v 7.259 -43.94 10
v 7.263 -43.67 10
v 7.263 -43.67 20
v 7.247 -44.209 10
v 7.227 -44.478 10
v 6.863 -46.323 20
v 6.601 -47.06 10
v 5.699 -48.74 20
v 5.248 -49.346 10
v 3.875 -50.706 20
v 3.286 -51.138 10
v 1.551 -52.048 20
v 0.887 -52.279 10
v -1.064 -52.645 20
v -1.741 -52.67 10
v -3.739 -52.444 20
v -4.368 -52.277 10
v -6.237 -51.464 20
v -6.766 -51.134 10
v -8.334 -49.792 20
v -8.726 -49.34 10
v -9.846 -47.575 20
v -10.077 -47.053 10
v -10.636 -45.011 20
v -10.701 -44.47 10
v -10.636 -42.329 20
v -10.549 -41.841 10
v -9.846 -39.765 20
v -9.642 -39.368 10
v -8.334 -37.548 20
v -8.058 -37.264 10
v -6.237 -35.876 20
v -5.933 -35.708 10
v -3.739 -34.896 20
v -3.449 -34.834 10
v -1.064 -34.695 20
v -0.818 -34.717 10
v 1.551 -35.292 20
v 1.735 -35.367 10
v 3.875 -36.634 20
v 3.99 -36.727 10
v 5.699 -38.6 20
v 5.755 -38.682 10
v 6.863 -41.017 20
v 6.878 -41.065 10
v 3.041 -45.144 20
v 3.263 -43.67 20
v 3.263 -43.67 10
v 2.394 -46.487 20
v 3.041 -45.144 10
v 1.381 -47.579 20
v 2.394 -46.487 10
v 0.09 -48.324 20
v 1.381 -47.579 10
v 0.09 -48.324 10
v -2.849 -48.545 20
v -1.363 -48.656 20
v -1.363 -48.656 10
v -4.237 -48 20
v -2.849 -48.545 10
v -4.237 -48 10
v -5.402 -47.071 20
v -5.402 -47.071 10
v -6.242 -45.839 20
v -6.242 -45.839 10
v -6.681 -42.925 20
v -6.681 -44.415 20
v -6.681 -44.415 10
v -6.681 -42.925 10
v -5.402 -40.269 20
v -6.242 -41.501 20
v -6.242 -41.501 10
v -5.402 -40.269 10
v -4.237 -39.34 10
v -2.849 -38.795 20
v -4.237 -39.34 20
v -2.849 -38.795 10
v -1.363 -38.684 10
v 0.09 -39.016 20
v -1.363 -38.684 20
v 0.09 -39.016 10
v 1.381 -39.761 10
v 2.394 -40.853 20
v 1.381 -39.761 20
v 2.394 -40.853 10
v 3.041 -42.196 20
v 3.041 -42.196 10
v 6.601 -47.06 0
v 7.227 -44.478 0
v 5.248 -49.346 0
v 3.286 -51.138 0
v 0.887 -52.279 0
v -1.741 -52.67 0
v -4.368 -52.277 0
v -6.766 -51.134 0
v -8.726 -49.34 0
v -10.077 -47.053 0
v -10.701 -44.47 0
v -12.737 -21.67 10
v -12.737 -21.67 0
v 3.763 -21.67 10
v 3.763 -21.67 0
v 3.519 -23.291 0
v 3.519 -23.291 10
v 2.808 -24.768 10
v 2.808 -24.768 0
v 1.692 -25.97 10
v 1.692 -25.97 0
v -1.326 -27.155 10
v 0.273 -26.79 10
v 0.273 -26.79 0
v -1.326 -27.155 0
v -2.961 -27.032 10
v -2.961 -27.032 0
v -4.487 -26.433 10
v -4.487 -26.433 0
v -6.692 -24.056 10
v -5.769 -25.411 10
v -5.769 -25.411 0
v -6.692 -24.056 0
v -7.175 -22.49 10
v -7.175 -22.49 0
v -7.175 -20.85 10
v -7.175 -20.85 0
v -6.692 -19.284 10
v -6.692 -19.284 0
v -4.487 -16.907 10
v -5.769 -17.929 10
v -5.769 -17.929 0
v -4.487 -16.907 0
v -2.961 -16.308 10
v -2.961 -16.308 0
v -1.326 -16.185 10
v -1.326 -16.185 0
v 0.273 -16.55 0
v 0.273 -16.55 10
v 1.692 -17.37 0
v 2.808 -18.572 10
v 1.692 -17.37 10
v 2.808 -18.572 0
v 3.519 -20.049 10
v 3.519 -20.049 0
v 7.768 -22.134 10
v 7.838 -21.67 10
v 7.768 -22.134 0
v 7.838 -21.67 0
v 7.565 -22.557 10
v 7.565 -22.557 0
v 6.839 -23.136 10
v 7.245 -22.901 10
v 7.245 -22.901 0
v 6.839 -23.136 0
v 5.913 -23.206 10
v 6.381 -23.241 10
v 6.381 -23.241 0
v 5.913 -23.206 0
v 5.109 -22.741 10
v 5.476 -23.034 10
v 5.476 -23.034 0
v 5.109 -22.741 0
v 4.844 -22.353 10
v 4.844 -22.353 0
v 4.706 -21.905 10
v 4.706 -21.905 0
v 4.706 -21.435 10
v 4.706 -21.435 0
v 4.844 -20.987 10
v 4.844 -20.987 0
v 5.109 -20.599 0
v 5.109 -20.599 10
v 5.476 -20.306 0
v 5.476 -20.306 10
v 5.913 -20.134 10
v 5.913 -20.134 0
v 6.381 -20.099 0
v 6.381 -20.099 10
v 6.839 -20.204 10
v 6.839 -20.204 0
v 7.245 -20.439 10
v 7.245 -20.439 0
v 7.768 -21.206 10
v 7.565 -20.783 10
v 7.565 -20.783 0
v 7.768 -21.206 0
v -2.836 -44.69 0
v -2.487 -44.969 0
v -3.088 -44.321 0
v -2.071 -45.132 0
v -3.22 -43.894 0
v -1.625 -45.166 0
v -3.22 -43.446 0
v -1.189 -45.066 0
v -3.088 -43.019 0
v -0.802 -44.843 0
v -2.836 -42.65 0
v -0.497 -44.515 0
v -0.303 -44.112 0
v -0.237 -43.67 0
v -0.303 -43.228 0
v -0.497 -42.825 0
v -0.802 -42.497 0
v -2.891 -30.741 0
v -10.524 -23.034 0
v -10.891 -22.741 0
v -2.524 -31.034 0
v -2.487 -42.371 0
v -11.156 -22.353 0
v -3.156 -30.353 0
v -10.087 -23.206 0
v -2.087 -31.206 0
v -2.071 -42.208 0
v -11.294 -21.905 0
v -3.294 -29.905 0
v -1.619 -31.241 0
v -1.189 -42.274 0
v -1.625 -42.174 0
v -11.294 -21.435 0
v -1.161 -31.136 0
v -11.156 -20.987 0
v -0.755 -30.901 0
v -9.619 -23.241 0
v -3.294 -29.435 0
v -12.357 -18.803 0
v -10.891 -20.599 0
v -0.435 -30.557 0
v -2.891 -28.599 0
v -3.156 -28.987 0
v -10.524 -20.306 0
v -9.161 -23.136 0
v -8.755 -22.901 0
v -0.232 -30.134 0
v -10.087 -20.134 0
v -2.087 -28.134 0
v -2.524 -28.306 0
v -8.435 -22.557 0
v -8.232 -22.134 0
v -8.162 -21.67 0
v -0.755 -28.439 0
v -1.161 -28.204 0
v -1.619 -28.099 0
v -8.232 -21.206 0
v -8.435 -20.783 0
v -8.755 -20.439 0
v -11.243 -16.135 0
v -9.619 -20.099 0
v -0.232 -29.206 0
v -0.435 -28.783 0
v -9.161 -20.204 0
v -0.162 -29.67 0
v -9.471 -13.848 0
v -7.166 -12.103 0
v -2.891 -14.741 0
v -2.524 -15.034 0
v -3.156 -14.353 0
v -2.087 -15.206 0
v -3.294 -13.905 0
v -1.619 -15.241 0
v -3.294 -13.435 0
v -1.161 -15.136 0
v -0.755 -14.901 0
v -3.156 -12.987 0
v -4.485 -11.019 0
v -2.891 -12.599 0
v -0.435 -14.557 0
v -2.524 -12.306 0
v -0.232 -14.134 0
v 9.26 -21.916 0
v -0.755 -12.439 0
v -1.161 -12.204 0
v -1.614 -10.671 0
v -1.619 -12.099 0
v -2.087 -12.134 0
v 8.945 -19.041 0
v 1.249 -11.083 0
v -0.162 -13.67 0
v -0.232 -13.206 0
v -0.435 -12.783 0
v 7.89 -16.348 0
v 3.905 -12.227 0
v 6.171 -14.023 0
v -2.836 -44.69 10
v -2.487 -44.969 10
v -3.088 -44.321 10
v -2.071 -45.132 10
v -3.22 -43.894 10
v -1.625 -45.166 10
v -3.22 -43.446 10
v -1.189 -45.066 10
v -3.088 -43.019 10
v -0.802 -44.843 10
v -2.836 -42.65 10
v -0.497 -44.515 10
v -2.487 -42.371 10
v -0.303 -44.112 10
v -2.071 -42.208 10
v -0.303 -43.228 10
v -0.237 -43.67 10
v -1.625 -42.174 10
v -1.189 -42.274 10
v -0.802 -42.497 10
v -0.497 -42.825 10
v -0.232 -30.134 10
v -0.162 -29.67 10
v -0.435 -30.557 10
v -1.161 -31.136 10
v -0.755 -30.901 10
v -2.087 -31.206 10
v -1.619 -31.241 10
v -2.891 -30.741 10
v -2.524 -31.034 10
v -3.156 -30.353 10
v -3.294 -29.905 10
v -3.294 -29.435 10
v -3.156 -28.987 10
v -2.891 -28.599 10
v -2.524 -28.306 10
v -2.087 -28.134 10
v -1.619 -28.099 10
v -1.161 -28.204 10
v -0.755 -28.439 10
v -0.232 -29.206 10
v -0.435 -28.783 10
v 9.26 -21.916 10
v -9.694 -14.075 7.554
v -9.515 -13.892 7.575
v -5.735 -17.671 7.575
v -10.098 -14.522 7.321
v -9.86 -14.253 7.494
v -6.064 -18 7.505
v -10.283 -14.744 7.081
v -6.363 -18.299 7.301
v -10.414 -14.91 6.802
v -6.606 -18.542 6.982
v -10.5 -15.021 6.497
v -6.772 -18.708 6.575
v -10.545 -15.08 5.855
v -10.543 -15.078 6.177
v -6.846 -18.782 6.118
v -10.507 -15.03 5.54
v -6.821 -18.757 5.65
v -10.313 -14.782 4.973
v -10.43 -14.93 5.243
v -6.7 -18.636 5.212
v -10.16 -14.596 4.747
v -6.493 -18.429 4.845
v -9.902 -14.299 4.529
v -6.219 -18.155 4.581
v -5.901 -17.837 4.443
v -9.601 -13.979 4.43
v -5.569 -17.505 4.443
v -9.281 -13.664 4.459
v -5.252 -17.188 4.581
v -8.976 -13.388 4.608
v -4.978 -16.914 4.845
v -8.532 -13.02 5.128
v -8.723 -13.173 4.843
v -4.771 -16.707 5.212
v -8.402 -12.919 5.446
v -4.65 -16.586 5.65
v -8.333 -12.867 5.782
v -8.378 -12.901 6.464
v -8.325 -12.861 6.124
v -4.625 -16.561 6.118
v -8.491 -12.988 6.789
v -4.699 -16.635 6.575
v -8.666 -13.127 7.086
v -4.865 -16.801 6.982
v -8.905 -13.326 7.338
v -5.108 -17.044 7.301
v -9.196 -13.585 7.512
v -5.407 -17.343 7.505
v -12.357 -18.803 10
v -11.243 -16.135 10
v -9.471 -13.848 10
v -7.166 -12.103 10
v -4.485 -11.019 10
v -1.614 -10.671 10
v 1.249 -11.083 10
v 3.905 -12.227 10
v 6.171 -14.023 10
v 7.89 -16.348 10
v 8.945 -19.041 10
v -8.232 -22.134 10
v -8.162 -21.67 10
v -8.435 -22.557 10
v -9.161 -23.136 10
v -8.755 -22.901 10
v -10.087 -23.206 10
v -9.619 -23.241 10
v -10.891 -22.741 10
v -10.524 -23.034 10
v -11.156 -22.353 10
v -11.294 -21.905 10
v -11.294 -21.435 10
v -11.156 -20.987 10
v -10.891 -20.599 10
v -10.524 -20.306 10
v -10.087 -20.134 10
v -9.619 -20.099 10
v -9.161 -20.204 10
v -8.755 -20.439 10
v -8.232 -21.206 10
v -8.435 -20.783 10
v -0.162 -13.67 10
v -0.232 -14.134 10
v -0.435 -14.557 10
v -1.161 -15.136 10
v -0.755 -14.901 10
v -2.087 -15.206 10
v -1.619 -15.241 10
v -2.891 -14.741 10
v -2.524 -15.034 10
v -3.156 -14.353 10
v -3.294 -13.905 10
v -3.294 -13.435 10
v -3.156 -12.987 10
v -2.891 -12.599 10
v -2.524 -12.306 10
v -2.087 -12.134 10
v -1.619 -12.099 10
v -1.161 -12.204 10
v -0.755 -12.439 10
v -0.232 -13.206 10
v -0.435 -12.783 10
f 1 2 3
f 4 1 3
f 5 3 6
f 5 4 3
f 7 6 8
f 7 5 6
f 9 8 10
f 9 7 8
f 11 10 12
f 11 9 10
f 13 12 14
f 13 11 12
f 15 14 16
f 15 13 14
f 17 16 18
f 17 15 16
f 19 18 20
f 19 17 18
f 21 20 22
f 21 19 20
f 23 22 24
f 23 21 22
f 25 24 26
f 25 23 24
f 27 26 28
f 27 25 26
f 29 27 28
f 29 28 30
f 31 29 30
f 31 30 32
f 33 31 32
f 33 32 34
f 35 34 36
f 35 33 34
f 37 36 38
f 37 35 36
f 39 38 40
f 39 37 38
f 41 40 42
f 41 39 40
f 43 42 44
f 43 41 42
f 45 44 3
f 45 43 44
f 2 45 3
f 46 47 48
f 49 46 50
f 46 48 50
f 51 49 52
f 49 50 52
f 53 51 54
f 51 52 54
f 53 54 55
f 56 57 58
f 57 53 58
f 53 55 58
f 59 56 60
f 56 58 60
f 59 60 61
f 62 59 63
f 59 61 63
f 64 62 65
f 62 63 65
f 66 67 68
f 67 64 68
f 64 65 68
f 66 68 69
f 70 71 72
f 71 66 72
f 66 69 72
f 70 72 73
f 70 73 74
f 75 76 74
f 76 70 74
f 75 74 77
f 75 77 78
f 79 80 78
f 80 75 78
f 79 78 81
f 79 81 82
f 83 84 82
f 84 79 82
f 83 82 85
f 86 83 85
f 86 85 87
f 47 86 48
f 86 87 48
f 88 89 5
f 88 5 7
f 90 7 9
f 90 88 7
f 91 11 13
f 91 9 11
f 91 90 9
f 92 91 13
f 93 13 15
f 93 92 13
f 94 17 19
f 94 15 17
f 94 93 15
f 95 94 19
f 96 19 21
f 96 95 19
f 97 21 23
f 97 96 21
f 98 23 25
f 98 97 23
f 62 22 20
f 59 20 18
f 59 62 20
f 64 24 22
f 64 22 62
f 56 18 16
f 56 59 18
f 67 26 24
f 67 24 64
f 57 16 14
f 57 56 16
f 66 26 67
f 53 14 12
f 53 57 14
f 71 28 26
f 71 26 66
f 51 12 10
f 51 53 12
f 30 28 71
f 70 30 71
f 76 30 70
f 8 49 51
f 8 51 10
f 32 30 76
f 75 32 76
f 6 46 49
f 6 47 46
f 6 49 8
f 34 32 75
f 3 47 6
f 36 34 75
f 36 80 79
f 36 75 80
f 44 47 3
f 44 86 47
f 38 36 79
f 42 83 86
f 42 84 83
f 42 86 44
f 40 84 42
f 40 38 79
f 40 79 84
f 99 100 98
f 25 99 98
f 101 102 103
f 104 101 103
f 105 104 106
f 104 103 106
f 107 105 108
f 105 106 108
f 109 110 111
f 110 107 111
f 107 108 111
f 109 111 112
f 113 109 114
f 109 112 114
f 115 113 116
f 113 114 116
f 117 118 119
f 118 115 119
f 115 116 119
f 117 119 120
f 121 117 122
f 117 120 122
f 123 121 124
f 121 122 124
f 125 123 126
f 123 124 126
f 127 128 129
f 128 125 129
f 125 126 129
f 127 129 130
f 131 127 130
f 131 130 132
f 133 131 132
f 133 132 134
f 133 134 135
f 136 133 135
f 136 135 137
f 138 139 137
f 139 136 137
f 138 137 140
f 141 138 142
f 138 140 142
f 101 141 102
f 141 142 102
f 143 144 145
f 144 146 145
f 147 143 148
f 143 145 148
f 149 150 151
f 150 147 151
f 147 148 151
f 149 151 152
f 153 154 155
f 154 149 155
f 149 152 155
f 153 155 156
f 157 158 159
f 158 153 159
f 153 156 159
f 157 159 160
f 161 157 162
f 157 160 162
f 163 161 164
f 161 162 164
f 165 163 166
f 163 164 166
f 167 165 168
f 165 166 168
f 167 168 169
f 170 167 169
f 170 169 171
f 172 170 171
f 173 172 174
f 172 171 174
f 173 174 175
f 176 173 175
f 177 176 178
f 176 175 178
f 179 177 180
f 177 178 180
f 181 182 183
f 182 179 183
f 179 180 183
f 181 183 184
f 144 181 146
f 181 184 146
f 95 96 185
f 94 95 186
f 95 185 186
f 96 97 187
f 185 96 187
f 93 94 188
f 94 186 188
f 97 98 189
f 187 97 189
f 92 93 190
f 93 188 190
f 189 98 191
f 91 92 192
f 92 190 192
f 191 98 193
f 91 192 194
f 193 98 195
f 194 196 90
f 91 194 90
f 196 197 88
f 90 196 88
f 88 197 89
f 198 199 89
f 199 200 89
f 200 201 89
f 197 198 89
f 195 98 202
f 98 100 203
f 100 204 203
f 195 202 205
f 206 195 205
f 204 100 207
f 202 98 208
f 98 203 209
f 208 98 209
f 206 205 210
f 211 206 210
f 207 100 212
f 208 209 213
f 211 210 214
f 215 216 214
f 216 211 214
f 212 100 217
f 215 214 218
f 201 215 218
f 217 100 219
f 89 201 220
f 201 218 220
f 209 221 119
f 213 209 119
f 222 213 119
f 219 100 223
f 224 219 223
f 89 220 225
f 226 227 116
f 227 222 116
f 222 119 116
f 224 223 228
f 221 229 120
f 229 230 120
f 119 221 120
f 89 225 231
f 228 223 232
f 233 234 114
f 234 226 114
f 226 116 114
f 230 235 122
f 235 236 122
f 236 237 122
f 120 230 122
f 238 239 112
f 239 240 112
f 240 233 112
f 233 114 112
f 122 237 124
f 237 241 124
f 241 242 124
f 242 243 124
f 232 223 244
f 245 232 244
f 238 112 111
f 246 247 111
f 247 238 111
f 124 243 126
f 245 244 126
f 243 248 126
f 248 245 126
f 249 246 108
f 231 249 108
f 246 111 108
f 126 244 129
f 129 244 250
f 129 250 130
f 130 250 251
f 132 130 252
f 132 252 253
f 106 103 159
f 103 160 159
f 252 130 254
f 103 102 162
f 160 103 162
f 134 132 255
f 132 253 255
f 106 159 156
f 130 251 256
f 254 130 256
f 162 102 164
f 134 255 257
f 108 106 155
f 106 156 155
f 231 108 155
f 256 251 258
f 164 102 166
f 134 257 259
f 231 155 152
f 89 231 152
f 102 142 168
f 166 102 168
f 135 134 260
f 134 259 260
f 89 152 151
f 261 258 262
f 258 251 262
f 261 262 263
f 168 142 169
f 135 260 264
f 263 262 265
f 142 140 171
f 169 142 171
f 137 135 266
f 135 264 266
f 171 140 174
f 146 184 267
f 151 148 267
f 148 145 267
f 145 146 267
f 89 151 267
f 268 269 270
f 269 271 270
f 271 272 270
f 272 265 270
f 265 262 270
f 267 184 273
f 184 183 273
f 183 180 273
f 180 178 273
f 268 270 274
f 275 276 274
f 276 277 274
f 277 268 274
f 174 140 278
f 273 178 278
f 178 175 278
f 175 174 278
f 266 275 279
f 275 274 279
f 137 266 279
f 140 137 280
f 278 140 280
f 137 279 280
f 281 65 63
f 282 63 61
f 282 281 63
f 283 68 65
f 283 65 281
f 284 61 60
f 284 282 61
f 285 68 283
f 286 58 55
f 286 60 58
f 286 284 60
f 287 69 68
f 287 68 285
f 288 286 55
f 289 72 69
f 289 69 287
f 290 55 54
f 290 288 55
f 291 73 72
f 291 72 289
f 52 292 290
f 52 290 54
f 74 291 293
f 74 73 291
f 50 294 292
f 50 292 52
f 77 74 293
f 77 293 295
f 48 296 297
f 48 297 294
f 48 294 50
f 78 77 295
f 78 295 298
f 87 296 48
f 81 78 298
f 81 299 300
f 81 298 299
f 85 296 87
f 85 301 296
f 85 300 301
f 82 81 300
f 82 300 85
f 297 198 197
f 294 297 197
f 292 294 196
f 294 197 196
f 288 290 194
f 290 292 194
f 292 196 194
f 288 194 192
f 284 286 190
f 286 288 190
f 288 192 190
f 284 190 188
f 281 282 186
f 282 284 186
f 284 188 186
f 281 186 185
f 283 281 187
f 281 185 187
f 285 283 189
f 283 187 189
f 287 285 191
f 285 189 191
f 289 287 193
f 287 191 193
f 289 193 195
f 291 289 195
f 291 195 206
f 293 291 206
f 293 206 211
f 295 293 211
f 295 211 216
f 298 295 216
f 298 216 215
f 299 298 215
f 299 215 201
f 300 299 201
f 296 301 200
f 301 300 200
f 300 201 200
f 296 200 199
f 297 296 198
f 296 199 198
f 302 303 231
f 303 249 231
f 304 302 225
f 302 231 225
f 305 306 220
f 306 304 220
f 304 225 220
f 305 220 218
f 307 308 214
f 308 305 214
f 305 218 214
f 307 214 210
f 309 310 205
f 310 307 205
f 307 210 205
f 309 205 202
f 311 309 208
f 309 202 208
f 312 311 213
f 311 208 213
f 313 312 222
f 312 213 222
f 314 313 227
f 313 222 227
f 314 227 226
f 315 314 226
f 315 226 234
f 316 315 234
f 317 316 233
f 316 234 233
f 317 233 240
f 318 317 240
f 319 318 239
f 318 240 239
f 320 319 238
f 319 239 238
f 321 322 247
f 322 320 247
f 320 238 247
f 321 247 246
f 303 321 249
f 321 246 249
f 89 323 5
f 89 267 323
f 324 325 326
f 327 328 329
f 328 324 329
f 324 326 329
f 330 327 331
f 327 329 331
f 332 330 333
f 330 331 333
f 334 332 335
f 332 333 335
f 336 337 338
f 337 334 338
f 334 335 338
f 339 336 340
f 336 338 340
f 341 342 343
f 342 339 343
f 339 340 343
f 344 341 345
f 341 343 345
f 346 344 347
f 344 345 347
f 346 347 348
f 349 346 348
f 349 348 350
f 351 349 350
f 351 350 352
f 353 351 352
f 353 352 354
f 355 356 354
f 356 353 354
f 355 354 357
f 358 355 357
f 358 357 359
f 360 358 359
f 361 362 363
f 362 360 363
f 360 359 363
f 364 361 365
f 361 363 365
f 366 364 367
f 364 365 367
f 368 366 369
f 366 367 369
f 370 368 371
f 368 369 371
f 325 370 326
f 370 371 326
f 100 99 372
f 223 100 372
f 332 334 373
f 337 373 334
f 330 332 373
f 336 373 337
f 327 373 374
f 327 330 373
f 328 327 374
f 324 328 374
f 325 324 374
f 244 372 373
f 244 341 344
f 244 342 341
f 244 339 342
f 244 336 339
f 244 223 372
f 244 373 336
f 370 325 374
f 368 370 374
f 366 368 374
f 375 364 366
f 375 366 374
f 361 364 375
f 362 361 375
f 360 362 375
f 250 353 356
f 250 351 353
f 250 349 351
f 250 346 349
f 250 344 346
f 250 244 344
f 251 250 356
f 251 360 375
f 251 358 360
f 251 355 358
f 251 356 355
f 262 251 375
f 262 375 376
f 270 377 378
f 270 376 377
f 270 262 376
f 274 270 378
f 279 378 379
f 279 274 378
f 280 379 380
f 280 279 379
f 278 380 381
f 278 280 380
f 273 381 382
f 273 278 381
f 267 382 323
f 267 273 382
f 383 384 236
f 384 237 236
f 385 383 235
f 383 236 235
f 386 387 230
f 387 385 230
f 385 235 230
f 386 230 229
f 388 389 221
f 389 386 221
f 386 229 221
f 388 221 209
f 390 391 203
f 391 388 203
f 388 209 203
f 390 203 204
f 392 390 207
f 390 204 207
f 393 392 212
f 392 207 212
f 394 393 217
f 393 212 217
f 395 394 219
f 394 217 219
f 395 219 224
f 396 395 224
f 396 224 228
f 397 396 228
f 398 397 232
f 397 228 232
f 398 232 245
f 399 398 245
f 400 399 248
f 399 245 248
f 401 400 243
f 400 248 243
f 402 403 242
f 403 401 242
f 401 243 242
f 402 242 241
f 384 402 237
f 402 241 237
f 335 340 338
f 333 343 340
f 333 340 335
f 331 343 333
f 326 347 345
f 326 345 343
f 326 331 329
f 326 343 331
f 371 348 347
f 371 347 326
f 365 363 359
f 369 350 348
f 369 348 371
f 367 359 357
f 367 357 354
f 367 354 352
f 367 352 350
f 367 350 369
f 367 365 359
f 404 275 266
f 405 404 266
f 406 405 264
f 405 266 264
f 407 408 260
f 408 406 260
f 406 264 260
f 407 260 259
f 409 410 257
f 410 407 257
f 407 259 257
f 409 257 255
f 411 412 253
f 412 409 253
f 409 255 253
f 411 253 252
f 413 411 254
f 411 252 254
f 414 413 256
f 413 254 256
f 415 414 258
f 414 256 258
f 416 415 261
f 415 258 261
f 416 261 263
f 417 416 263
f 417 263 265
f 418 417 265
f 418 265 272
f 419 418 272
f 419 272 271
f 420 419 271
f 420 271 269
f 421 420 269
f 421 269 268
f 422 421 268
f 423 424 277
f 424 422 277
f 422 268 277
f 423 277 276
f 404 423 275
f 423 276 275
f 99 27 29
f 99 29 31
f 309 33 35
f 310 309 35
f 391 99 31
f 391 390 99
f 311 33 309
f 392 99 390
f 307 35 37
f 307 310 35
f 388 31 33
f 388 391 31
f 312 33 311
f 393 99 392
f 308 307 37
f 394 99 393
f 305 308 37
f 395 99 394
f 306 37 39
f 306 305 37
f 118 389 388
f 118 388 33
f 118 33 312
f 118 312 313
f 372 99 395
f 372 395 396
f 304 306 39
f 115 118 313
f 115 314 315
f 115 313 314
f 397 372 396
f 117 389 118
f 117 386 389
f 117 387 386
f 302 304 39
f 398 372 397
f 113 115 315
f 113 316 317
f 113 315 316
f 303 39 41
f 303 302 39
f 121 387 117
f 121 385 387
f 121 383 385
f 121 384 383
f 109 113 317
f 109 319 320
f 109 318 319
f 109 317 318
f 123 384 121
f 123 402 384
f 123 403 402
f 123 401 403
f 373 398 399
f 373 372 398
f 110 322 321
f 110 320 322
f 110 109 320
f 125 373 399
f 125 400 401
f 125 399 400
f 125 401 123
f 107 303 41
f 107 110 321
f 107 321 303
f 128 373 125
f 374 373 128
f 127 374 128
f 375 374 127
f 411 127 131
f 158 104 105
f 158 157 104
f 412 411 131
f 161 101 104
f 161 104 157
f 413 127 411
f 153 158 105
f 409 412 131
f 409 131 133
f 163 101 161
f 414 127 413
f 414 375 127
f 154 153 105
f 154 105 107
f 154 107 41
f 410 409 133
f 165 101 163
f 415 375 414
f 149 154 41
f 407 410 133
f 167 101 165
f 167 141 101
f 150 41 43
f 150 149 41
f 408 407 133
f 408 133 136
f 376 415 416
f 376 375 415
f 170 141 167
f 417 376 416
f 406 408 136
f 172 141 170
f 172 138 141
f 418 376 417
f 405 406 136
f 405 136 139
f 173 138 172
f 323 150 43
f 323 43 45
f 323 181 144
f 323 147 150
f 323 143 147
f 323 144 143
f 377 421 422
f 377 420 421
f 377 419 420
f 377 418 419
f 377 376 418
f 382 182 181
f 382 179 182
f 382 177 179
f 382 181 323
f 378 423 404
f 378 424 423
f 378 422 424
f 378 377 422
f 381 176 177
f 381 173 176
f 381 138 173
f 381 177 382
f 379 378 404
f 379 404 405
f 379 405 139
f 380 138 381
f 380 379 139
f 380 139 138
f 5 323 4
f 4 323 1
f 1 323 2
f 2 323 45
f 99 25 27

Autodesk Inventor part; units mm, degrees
ref_plane "YZ Plane" through (0, 0, 0) normal (1, 0, 0) x (0, 1, 0)
sketch "Эскиз1" plane through (0, 0, 0) normal (0, 0, 1) x (1, 0, 0)
  circle A0 centre (-1.7368, -21.67) radius 2.375 projected
  circle A1 centre (-1.7368, -21.67) radius 7.5
  line L0 (-1.7368, -14.17) -> (-1.7368, -54.17) construction
  arc A2 (5.7632, -21.67) -> (-9.2368, -21.67) centre (-1.7368, -21.67) ccw
  circle A3 centre (-1.7368, -43.67) radius 9
  circle A4 centre (-1.7368, -43.67) radius 1.5
  circle A5 centre (-1.7368, -43.67) radius 5
  line L1 (-10.7368, -43.67) -> (-9.2368, -21.67)
  line L2 (7.2632, -43.67) -> (5.7632, -21.67)
  point P0 (0, 0)
  point P1 (-1.7368, -34.17)
  dimension "d1" = 15
  dimension "d3" = 18
  dimension "d4" = 3
  dimension "d9" = 10
  dimension "d36" = 22
extrude "Выдавливание1" add sketch "Эскиз1" along normal blind 20 contours L2 A3 L1 | A3 L2 | L1 A3
ref_plane "РабПлоскость1" through (0, 0, 0) normal (0, 0, 1) x (1, 0, 0)
sketch "Эскиз2" plane through (0, 0, 0) normal (0, 0, 1) x (1, 0, 0)
  arc A0 (-10.7011, -44.4704) -> (7.2269, -44.4779) centre (-1.7368, -43.67) ccw
  circle A1 centre (-1.7368, -46.2892) radius 1.5 construction
  line L0 (-1.7368, -46.2892) -> (-1.7368, -6.2497) construction
  line L1 (55.1846, -47.0725) -> (61.6072, -35.9345) construction
  line L2 (61.6072, -35.9345) -> (57.2758, -33.4368) construction
  line L3 (57.2758, -33.4368) -> (59.7378, -29.1672) construction
  line L4 (59.7378, -29.1672) -> (54.2369, -25.9951) construction
  line L5 (54.2369, -25.9951) -> (53.6124, -27.078) construction
  line L6 (53.6124, -27.078) -> (51.62, -25.929) construction
  line L7 (51.62, -25.929) -> (52.2444, -24.8462) construction
  line L8 (52.2444, -24.8462) -> (46.7434, -21.6741) construction
  line L9 (46.7434, -21.6741) -> (48.2421, -19.0752) construction
  line L10 (48.2421, -19.0752) -> (53.743, -22.2473) construction
  line L11 (53.743, -22.2473) -> (54.3674, -21.1644) construction
  line L12 (54.3674, -21.1644) -> (56.3599, -22.3134) construction
  line L13 (56.3599, -22.3134) -> (55.7355, -23.3962) construction
  line L14 (55.7355, -23.3962) -> (61.2364, -26.5683) construction
  line L15 (61.2364, -26.5683) -> (63.6984, -22.2987) construction
  line L16 (63.6984, -22.2987) -> (68.0299, -24.7964) construction
  line L17 (68.0299, -24.7964) -> (74.4526, -13.6584) construction
  line L18 (74.4526, -13.6584) -> (23.3414, 15.8145) construction
  arc A2 (23.3414, 15.8145) -> (19.2439, 14.7142) centre (21.8428, 13.2156) ccw construction
  line L19 (19.2439, 14.7142) -> (16.6854, 10.2772) construction
  arc A3 (12.8035, 9.064) -> (16.6854, 10.2772) centre (14.0865, 11.7758) ccw construction
  arc A4 (12.8035, 9.064) -> (-21.0534, -49.6498) centre (-1.7368, -21.67) ccw construction
  arc A5 (-20.1589, -53.6172) -> (-21.0534, -49.6498) centre (-22.7578, -52.1186) ccw construction
  line L20 (-20.1589, -53.6172) -> (-22.7175, -58.0542) construction
  arc A6 (-22.7175, -58.0542) -> (-21.6172, -62.1517) centre (-20.1186, -59.5528) ccw construction
  line L21 (-21.6172, -62.1517) -> (29.4939, -91.6246) construction
  line L22 (29.4939, -91.6246) -> (35.9166, -80.4866) construction
  line L23 (35.9166, -80.4866) -> (31.5851, -77.9889) construction
  line L24 (31.5851, -77.9889) -> (34.0472, -73.7193) construction
  line L25 (34.0472, -73.7193) -> (28.5462, -70.5472) construction
  line L26 (28.5462, -70.5472) -> (27.9218, -71.6301) construction
  line L27 (27.9218, -71.6301) -> (25.9293, -70.4811) construction
  line L28 (25.9293, -70.4811) -> (26.5537, -69.3983) construction
  line L29 (26.5537, -69.3983) -> (21.0528, -66.2262) construction
  line L30 (21.0528, -66.2262) -> (22.5514, -63.6273) construction
  line L31 (22.5514, -63.6273) -> (28.0524, -66.7994) construction
  line L32 (28.0524, -66.7994) -> (28.6768, -65.7165) construction
  line L33 (28.6768, -65.7165) -> (30.6693, -66.8655) construction
  line L34 (30.6693, -66.8655) -> (30.0448, -67.9483) construction
  line L35 (30.0448, -67.9483) -> (35.5458, -71.1204) construction
  line L36 (35.5458, -71.1204) -> (38.0078, -66.8508) construction
  line L37 (38.0078, -66.8508) -> (42.3393, -69.3485) construction
  line L38 (42.3393, -69.3485) -> (48.7619, -58.2105) construction
  line L39 (48.7619, -58.2105) -> (44.4305, -55.7128) construction
  line L40 (44.4305, -55.7128) -> (50.8531, -44.5748) construction
  line L41 (50.8531, -44.5748) -> (55.1846, -47.0725) construction
  circle A7 centre (-1.7368, -21.67) radius 2.375 construction
  circle A8 centre (-1.7368, -21.67) radius 5.5
  arc A9 (9.1272, -23.3947) -> (-12.5628, -23.6187) centre (-1.7368, -21.67) ccw
  line L42 (-12.7368, -21.67) -> (-10.7011, -44.4704)
  circle A10 centre (-1.7368, -43.67) radius 9 construction
  line L43 (9.2605, -21.9158) -> (7.2269, -44.4779)
  circle A11 centre (-1.7368, -43.67) radius 1.5
  circle A12 centre (-1.7368, -13.67) radius 1.575
  circle A13 centre (6.2632, -21.67) radius 1.575
  circle A14 centre (-1.7368, -29.67) radius 1.575
  circle A15 centre (-9.7368, -21.67) radius 1.575
  point P0 (0, 0)
  point P1 (-1.7368, -12.095)
  point P2 (-1.7368, -10.67)
  point P3 (-1.7368, -10.67)
  point P4 (7.8382, -21.67)
  point P5 (-1.7368, -31.245)
  point P6 (-11.3118, -21.67)
  dimension "d22" = 3.15
  dimension "d20" = 11
  dimension "d21" = 22
  dimension "d27" = 8
  dimension "d30" = 360
extrude "Выдавливание2" add sketch "Эскиз2" along normal blind 10 contours L42 A9 L43 A0
ref_plane "РабПлоскость5" through (-9.7368, -21.67, 0) normal (-0.7071068, 0.7071068, 0) x (0, 0, 1)
sketch "Эскиз4" plane through (-9.7368, -21.67, 0) normal (-0.7071068, 0.7071068, 0) x (0, 0, 1)
  line L0 (10, 1.575) -> (0, 1.575) construction
  line L1 (0, 9.7387) -> (10, 9.7387) construction
  line L2 (10, -3.8949) -> (0, -3.8949) construction
  line L3 (0, -3.8949) -> (0, -1.575) construction
  line L4 (0, -1.575) -> (10, -1.575) construction
  line L5 (10, -1.575) -> (10, -3.8949) construction
  line L6 (0, 15.0908) -> (10, 15.0908) construction
  line L7 (10, 15.0908) -> (10, 12.8887) construction
  line L8 (10, 12.8887) -> (0, 12.8887) construction
  line L9 (0, 12.8887) -> (0, 15.0908) construction
  line L10 (10, 1.575) -> (10, -1.575) construction
  line L11 (0, 12.8887) -> (0, 9.7387) construction
  circle A0 centre (6, 5.6568) radius 1.575
  line L12 (0, 1.575) -> (0, 9.7387) projected
  line L13 (10, 9.7387) -> (10, 1.575) projected
  point P0 (0, 22.208)
  dimension "d32" = 3.15
extrude "Выдавливание4" cut sketch "Эскиз4" along normal blind 10
properties part number "кривошип" material "Пластик САН"
